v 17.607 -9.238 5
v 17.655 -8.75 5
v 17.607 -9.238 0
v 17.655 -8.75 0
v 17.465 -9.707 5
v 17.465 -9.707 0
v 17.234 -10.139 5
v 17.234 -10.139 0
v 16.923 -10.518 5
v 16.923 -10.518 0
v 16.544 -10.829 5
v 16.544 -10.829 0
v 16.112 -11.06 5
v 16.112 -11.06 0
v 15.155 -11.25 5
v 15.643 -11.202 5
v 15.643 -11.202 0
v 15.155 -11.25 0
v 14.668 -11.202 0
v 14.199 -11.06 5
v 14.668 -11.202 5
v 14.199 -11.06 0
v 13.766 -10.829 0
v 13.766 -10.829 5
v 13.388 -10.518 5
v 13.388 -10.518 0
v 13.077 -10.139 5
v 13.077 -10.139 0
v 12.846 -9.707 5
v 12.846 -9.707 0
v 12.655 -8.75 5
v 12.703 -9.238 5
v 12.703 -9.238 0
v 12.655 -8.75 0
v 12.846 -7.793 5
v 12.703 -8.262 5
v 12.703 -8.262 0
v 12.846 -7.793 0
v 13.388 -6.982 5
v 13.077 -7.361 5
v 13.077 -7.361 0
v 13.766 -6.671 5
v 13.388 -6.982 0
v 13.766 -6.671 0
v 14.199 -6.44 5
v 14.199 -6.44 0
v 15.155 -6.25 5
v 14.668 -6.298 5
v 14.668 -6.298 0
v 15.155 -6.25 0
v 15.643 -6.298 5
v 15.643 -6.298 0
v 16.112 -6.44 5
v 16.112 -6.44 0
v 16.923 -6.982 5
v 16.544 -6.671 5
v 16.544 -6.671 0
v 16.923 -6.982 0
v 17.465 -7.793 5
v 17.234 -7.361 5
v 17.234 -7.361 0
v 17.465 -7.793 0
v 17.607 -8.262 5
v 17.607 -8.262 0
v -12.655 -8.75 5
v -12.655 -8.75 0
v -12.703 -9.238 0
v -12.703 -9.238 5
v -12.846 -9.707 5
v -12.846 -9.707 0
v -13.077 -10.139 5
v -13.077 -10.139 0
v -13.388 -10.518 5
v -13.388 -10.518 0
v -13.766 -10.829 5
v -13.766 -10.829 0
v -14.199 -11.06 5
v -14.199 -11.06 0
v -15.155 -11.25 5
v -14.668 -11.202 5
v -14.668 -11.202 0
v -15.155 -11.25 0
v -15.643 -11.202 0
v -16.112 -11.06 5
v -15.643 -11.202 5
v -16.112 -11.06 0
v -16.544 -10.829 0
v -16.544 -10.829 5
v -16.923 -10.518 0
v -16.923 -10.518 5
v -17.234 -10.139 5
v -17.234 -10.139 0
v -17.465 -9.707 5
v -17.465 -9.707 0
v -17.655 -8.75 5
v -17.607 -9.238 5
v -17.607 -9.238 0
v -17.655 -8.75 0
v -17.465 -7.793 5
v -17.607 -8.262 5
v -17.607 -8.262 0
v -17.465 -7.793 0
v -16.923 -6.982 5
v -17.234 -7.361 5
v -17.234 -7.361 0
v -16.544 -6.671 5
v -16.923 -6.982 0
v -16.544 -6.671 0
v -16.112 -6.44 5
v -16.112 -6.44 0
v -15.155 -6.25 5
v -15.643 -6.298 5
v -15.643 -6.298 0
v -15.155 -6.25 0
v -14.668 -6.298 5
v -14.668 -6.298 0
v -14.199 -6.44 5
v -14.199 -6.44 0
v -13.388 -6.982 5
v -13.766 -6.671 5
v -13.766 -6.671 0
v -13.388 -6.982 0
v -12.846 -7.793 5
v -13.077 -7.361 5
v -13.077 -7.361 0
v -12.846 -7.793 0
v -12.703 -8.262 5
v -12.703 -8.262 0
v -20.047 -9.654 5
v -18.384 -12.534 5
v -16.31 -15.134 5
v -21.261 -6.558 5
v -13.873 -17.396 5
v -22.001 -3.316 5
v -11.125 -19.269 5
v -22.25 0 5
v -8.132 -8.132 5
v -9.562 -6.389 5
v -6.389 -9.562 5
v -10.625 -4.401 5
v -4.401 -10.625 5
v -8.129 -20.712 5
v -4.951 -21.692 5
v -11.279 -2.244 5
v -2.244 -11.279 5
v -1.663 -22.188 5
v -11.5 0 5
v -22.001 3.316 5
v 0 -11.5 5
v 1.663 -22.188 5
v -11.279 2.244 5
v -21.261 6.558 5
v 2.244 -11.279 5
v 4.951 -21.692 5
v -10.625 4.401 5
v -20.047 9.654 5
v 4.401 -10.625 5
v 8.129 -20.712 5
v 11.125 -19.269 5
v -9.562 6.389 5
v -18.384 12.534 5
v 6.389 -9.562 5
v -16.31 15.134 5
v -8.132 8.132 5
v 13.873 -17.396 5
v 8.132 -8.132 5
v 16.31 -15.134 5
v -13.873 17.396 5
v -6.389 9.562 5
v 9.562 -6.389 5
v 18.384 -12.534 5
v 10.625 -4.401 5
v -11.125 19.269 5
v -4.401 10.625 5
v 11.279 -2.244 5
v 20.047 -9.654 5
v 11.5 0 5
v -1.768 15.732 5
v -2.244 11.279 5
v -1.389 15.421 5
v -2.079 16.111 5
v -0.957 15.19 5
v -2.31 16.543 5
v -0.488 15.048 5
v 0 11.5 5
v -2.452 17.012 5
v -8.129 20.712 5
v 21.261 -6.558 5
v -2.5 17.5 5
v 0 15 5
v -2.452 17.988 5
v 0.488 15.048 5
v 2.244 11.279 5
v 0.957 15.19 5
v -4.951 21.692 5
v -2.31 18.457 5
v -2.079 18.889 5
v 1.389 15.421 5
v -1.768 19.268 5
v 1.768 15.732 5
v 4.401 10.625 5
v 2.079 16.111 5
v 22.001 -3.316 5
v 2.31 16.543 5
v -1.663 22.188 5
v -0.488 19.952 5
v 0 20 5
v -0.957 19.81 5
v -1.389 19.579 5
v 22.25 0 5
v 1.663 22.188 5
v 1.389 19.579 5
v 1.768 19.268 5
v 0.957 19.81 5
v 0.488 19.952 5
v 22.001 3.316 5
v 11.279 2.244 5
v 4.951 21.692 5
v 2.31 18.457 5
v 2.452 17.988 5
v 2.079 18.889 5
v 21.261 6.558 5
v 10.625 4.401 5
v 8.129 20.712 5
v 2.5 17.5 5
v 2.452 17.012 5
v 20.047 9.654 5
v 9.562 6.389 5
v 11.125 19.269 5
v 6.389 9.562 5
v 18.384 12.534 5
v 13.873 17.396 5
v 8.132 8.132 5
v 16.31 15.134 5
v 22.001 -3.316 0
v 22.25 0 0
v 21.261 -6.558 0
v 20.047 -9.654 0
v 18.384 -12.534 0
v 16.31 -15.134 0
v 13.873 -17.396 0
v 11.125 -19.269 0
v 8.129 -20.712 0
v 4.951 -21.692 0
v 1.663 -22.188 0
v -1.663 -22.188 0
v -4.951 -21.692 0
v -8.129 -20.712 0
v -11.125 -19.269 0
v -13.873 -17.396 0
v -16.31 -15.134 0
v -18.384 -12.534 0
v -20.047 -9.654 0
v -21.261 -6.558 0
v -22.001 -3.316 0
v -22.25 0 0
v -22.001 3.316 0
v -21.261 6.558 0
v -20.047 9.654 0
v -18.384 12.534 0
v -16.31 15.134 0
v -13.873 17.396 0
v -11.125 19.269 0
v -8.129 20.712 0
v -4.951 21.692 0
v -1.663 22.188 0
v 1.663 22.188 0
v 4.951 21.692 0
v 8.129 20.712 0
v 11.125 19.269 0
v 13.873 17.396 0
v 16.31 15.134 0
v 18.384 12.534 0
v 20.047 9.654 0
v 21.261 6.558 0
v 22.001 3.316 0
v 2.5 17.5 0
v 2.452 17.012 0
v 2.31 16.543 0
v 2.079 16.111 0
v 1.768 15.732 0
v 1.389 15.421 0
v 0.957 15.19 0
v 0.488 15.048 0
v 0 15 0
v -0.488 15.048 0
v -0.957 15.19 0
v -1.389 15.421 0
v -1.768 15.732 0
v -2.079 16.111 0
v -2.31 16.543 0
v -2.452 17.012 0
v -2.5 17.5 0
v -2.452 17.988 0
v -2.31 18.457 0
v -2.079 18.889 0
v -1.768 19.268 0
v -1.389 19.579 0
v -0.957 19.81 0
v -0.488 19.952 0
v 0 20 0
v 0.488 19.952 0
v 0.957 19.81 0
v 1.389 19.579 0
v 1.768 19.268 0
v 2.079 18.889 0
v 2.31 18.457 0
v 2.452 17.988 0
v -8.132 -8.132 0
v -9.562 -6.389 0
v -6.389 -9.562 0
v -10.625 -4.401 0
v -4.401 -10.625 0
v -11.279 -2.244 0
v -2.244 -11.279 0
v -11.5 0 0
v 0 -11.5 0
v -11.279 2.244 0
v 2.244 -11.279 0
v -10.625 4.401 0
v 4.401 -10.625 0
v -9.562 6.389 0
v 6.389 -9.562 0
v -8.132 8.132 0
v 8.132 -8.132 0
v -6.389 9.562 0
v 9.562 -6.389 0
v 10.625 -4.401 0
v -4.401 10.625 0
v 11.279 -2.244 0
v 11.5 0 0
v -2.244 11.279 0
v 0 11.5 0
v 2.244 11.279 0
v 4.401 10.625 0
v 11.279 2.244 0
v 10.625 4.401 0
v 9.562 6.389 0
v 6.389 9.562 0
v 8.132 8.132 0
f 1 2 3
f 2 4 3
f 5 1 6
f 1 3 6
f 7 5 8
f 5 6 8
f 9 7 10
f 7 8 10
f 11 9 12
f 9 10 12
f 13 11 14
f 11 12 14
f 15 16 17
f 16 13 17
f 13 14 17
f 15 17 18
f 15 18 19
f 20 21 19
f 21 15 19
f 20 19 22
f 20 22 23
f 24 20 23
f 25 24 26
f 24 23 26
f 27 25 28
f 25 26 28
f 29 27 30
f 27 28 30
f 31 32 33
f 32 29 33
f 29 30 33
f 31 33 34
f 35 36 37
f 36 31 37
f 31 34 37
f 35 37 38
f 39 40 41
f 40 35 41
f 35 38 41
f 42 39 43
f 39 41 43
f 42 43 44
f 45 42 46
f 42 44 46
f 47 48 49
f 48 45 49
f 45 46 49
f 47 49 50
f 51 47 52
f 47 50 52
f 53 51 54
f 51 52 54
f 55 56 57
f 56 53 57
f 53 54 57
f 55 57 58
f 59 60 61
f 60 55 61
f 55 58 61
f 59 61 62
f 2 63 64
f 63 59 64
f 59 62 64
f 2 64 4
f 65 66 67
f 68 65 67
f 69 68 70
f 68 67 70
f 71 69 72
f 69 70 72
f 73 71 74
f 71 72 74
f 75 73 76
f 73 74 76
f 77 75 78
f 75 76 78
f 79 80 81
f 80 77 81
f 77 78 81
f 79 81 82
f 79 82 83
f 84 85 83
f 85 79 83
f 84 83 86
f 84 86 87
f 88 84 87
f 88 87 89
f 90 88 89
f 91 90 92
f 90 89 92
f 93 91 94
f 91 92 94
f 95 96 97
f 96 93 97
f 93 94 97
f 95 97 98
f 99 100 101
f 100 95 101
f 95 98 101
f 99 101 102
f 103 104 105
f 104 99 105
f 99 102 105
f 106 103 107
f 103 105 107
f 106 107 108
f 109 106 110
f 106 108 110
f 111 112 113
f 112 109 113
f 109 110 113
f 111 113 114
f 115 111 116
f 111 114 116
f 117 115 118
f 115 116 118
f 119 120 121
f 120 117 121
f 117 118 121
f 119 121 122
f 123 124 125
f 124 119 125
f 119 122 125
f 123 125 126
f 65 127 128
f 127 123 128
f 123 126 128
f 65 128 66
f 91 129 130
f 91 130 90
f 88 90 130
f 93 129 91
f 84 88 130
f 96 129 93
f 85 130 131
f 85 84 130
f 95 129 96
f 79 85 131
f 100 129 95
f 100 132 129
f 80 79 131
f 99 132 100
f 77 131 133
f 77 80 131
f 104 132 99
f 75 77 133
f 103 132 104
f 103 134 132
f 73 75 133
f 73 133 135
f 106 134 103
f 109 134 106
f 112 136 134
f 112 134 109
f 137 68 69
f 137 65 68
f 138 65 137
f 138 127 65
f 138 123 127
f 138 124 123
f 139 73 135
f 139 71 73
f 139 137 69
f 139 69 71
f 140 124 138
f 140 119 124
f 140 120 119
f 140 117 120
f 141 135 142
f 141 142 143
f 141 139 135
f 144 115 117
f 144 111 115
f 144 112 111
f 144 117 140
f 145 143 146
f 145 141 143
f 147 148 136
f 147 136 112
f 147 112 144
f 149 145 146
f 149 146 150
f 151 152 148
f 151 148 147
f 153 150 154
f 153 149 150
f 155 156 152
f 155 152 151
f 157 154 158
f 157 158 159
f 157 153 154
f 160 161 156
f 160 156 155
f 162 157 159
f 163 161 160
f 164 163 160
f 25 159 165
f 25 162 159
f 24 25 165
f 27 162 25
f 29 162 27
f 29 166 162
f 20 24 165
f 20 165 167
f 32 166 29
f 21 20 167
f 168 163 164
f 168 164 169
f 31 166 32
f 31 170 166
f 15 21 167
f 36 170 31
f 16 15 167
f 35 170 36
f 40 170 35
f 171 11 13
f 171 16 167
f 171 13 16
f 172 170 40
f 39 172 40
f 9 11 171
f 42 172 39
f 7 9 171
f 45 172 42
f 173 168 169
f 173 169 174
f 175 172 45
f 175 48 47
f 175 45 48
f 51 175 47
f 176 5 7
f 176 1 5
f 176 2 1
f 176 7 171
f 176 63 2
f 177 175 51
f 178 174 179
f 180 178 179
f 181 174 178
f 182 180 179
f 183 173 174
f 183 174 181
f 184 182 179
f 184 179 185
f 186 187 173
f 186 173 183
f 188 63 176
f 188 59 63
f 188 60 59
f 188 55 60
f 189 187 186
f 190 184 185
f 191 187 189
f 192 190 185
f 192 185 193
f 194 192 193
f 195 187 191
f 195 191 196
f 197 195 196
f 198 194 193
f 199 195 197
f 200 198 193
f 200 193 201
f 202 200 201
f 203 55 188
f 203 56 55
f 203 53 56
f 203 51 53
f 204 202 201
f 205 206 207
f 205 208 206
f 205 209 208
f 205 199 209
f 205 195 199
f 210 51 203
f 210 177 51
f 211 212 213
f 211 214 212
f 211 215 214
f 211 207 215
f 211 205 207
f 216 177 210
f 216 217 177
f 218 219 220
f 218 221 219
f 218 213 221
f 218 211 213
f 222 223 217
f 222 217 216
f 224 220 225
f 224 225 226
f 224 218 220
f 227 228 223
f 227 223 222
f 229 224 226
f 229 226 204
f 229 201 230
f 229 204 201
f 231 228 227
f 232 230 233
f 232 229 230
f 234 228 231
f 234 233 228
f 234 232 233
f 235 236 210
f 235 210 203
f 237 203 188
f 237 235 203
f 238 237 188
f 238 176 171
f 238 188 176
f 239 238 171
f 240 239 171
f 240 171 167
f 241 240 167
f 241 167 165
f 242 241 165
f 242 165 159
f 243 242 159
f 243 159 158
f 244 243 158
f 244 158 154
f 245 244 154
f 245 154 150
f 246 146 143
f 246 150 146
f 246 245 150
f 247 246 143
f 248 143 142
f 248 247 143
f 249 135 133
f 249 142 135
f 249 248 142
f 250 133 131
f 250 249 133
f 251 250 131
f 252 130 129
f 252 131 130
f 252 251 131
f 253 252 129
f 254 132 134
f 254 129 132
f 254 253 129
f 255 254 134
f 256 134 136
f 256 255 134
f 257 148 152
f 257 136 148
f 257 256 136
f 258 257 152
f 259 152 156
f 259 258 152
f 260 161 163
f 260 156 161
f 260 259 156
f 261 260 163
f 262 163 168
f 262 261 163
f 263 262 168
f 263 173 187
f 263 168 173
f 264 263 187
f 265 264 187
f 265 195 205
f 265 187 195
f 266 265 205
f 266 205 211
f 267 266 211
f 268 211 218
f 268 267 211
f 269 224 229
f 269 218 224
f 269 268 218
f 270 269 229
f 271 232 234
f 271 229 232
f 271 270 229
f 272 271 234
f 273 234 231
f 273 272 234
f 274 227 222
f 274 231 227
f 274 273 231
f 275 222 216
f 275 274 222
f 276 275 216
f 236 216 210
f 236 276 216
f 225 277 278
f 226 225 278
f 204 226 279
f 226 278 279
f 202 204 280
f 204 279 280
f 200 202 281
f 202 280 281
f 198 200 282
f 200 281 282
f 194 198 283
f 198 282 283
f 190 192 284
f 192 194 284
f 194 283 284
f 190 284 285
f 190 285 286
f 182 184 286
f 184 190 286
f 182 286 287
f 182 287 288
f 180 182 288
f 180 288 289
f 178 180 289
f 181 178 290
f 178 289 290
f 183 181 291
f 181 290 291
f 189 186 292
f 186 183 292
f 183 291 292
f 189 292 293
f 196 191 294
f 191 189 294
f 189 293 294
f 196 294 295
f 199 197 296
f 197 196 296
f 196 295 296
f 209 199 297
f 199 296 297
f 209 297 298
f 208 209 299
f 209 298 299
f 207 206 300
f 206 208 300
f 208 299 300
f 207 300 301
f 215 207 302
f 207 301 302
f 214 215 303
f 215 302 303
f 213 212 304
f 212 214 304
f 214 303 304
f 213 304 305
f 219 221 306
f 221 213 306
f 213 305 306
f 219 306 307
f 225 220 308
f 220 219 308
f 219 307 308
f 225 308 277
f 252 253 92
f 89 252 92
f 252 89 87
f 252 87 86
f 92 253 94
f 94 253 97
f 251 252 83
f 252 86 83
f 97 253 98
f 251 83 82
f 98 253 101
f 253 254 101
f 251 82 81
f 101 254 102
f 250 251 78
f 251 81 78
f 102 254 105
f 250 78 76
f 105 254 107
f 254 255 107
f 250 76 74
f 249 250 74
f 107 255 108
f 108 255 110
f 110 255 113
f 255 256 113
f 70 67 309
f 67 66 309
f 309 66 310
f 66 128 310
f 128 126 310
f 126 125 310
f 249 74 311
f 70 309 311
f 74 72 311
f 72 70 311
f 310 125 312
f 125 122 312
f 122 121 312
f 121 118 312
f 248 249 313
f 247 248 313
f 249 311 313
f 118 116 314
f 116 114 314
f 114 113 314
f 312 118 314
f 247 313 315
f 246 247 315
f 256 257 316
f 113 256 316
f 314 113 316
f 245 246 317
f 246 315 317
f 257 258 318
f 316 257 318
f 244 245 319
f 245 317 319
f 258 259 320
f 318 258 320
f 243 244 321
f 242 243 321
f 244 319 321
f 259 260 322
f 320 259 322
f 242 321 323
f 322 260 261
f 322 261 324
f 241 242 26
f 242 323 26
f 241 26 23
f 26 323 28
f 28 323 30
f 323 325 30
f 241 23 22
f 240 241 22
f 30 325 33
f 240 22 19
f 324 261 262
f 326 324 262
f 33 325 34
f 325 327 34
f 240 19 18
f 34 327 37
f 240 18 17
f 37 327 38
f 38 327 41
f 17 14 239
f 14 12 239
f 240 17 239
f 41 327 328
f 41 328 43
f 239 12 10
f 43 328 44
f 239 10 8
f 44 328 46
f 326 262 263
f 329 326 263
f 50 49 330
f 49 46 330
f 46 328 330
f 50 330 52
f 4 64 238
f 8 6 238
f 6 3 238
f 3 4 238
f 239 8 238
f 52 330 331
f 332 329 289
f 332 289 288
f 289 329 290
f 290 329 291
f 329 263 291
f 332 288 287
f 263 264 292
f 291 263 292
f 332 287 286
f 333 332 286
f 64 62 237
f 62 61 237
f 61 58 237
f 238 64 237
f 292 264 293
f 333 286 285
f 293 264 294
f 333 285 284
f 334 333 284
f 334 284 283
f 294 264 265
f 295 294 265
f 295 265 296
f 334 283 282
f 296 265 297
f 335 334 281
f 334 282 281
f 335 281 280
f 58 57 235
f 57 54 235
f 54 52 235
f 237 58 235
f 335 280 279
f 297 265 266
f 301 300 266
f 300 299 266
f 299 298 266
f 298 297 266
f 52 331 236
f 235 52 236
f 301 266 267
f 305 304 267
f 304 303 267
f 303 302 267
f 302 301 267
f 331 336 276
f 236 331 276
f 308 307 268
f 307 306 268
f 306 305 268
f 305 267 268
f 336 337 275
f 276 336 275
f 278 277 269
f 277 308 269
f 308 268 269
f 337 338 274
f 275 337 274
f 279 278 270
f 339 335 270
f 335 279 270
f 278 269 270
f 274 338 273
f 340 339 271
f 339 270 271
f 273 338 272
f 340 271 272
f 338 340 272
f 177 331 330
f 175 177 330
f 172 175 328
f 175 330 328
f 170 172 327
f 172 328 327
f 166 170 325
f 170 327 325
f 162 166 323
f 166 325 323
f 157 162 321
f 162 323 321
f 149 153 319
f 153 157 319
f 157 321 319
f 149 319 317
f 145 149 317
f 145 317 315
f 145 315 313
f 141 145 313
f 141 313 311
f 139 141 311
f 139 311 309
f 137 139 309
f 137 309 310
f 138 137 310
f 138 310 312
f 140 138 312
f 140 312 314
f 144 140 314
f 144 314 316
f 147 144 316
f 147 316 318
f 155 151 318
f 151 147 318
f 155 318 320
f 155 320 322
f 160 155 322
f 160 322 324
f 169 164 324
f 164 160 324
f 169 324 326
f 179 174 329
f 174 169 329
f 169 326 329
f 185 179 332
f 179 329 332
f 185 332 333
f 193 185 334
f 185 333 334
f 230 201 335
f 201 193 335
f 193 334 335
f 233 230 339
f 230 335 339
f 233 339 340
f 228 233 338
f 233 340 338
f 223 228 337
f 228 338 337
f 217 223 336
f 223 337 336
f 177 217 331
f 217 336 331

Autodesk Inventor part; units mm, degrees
ref_plane "YZ Plane" through (0, 0, 0) normal (1, 0, 0) x (0, 1, 0)
ref_plane "XZ Plane" through (0, 0, 0) normal (0, 1, 0) x (-1, 0, 0)
ref_plane "XY Plane" through (0, 0, 0) normal (0, 0, 1) x (1, 0, 0)
sketch "Sketch1" plane through (0, 0, 0) normal (0, 0, 1) x (1, 0, 0)
  circle A0 centre (0, 0) radius 11.5
  circle A1 centre (0, 0) radius 22.25
  circle A2 centre (0, 17.5) radius 2.5
  circle A3 centre (-15.1554, -8.75) radius 2.5
  circle A4 centre (15.1554, -8.75) radius 2.5
  dimension "d0" = 23
  dimension "d1" = 44.5
  dimension "d2" = 5
  dimension "d3" = 17.5
  dimension "d6" = 360
extrude "Extrusion1" add sketch "Sketch1" along normal blind 5
properties part number "TA06" material "ABS Plastic"
